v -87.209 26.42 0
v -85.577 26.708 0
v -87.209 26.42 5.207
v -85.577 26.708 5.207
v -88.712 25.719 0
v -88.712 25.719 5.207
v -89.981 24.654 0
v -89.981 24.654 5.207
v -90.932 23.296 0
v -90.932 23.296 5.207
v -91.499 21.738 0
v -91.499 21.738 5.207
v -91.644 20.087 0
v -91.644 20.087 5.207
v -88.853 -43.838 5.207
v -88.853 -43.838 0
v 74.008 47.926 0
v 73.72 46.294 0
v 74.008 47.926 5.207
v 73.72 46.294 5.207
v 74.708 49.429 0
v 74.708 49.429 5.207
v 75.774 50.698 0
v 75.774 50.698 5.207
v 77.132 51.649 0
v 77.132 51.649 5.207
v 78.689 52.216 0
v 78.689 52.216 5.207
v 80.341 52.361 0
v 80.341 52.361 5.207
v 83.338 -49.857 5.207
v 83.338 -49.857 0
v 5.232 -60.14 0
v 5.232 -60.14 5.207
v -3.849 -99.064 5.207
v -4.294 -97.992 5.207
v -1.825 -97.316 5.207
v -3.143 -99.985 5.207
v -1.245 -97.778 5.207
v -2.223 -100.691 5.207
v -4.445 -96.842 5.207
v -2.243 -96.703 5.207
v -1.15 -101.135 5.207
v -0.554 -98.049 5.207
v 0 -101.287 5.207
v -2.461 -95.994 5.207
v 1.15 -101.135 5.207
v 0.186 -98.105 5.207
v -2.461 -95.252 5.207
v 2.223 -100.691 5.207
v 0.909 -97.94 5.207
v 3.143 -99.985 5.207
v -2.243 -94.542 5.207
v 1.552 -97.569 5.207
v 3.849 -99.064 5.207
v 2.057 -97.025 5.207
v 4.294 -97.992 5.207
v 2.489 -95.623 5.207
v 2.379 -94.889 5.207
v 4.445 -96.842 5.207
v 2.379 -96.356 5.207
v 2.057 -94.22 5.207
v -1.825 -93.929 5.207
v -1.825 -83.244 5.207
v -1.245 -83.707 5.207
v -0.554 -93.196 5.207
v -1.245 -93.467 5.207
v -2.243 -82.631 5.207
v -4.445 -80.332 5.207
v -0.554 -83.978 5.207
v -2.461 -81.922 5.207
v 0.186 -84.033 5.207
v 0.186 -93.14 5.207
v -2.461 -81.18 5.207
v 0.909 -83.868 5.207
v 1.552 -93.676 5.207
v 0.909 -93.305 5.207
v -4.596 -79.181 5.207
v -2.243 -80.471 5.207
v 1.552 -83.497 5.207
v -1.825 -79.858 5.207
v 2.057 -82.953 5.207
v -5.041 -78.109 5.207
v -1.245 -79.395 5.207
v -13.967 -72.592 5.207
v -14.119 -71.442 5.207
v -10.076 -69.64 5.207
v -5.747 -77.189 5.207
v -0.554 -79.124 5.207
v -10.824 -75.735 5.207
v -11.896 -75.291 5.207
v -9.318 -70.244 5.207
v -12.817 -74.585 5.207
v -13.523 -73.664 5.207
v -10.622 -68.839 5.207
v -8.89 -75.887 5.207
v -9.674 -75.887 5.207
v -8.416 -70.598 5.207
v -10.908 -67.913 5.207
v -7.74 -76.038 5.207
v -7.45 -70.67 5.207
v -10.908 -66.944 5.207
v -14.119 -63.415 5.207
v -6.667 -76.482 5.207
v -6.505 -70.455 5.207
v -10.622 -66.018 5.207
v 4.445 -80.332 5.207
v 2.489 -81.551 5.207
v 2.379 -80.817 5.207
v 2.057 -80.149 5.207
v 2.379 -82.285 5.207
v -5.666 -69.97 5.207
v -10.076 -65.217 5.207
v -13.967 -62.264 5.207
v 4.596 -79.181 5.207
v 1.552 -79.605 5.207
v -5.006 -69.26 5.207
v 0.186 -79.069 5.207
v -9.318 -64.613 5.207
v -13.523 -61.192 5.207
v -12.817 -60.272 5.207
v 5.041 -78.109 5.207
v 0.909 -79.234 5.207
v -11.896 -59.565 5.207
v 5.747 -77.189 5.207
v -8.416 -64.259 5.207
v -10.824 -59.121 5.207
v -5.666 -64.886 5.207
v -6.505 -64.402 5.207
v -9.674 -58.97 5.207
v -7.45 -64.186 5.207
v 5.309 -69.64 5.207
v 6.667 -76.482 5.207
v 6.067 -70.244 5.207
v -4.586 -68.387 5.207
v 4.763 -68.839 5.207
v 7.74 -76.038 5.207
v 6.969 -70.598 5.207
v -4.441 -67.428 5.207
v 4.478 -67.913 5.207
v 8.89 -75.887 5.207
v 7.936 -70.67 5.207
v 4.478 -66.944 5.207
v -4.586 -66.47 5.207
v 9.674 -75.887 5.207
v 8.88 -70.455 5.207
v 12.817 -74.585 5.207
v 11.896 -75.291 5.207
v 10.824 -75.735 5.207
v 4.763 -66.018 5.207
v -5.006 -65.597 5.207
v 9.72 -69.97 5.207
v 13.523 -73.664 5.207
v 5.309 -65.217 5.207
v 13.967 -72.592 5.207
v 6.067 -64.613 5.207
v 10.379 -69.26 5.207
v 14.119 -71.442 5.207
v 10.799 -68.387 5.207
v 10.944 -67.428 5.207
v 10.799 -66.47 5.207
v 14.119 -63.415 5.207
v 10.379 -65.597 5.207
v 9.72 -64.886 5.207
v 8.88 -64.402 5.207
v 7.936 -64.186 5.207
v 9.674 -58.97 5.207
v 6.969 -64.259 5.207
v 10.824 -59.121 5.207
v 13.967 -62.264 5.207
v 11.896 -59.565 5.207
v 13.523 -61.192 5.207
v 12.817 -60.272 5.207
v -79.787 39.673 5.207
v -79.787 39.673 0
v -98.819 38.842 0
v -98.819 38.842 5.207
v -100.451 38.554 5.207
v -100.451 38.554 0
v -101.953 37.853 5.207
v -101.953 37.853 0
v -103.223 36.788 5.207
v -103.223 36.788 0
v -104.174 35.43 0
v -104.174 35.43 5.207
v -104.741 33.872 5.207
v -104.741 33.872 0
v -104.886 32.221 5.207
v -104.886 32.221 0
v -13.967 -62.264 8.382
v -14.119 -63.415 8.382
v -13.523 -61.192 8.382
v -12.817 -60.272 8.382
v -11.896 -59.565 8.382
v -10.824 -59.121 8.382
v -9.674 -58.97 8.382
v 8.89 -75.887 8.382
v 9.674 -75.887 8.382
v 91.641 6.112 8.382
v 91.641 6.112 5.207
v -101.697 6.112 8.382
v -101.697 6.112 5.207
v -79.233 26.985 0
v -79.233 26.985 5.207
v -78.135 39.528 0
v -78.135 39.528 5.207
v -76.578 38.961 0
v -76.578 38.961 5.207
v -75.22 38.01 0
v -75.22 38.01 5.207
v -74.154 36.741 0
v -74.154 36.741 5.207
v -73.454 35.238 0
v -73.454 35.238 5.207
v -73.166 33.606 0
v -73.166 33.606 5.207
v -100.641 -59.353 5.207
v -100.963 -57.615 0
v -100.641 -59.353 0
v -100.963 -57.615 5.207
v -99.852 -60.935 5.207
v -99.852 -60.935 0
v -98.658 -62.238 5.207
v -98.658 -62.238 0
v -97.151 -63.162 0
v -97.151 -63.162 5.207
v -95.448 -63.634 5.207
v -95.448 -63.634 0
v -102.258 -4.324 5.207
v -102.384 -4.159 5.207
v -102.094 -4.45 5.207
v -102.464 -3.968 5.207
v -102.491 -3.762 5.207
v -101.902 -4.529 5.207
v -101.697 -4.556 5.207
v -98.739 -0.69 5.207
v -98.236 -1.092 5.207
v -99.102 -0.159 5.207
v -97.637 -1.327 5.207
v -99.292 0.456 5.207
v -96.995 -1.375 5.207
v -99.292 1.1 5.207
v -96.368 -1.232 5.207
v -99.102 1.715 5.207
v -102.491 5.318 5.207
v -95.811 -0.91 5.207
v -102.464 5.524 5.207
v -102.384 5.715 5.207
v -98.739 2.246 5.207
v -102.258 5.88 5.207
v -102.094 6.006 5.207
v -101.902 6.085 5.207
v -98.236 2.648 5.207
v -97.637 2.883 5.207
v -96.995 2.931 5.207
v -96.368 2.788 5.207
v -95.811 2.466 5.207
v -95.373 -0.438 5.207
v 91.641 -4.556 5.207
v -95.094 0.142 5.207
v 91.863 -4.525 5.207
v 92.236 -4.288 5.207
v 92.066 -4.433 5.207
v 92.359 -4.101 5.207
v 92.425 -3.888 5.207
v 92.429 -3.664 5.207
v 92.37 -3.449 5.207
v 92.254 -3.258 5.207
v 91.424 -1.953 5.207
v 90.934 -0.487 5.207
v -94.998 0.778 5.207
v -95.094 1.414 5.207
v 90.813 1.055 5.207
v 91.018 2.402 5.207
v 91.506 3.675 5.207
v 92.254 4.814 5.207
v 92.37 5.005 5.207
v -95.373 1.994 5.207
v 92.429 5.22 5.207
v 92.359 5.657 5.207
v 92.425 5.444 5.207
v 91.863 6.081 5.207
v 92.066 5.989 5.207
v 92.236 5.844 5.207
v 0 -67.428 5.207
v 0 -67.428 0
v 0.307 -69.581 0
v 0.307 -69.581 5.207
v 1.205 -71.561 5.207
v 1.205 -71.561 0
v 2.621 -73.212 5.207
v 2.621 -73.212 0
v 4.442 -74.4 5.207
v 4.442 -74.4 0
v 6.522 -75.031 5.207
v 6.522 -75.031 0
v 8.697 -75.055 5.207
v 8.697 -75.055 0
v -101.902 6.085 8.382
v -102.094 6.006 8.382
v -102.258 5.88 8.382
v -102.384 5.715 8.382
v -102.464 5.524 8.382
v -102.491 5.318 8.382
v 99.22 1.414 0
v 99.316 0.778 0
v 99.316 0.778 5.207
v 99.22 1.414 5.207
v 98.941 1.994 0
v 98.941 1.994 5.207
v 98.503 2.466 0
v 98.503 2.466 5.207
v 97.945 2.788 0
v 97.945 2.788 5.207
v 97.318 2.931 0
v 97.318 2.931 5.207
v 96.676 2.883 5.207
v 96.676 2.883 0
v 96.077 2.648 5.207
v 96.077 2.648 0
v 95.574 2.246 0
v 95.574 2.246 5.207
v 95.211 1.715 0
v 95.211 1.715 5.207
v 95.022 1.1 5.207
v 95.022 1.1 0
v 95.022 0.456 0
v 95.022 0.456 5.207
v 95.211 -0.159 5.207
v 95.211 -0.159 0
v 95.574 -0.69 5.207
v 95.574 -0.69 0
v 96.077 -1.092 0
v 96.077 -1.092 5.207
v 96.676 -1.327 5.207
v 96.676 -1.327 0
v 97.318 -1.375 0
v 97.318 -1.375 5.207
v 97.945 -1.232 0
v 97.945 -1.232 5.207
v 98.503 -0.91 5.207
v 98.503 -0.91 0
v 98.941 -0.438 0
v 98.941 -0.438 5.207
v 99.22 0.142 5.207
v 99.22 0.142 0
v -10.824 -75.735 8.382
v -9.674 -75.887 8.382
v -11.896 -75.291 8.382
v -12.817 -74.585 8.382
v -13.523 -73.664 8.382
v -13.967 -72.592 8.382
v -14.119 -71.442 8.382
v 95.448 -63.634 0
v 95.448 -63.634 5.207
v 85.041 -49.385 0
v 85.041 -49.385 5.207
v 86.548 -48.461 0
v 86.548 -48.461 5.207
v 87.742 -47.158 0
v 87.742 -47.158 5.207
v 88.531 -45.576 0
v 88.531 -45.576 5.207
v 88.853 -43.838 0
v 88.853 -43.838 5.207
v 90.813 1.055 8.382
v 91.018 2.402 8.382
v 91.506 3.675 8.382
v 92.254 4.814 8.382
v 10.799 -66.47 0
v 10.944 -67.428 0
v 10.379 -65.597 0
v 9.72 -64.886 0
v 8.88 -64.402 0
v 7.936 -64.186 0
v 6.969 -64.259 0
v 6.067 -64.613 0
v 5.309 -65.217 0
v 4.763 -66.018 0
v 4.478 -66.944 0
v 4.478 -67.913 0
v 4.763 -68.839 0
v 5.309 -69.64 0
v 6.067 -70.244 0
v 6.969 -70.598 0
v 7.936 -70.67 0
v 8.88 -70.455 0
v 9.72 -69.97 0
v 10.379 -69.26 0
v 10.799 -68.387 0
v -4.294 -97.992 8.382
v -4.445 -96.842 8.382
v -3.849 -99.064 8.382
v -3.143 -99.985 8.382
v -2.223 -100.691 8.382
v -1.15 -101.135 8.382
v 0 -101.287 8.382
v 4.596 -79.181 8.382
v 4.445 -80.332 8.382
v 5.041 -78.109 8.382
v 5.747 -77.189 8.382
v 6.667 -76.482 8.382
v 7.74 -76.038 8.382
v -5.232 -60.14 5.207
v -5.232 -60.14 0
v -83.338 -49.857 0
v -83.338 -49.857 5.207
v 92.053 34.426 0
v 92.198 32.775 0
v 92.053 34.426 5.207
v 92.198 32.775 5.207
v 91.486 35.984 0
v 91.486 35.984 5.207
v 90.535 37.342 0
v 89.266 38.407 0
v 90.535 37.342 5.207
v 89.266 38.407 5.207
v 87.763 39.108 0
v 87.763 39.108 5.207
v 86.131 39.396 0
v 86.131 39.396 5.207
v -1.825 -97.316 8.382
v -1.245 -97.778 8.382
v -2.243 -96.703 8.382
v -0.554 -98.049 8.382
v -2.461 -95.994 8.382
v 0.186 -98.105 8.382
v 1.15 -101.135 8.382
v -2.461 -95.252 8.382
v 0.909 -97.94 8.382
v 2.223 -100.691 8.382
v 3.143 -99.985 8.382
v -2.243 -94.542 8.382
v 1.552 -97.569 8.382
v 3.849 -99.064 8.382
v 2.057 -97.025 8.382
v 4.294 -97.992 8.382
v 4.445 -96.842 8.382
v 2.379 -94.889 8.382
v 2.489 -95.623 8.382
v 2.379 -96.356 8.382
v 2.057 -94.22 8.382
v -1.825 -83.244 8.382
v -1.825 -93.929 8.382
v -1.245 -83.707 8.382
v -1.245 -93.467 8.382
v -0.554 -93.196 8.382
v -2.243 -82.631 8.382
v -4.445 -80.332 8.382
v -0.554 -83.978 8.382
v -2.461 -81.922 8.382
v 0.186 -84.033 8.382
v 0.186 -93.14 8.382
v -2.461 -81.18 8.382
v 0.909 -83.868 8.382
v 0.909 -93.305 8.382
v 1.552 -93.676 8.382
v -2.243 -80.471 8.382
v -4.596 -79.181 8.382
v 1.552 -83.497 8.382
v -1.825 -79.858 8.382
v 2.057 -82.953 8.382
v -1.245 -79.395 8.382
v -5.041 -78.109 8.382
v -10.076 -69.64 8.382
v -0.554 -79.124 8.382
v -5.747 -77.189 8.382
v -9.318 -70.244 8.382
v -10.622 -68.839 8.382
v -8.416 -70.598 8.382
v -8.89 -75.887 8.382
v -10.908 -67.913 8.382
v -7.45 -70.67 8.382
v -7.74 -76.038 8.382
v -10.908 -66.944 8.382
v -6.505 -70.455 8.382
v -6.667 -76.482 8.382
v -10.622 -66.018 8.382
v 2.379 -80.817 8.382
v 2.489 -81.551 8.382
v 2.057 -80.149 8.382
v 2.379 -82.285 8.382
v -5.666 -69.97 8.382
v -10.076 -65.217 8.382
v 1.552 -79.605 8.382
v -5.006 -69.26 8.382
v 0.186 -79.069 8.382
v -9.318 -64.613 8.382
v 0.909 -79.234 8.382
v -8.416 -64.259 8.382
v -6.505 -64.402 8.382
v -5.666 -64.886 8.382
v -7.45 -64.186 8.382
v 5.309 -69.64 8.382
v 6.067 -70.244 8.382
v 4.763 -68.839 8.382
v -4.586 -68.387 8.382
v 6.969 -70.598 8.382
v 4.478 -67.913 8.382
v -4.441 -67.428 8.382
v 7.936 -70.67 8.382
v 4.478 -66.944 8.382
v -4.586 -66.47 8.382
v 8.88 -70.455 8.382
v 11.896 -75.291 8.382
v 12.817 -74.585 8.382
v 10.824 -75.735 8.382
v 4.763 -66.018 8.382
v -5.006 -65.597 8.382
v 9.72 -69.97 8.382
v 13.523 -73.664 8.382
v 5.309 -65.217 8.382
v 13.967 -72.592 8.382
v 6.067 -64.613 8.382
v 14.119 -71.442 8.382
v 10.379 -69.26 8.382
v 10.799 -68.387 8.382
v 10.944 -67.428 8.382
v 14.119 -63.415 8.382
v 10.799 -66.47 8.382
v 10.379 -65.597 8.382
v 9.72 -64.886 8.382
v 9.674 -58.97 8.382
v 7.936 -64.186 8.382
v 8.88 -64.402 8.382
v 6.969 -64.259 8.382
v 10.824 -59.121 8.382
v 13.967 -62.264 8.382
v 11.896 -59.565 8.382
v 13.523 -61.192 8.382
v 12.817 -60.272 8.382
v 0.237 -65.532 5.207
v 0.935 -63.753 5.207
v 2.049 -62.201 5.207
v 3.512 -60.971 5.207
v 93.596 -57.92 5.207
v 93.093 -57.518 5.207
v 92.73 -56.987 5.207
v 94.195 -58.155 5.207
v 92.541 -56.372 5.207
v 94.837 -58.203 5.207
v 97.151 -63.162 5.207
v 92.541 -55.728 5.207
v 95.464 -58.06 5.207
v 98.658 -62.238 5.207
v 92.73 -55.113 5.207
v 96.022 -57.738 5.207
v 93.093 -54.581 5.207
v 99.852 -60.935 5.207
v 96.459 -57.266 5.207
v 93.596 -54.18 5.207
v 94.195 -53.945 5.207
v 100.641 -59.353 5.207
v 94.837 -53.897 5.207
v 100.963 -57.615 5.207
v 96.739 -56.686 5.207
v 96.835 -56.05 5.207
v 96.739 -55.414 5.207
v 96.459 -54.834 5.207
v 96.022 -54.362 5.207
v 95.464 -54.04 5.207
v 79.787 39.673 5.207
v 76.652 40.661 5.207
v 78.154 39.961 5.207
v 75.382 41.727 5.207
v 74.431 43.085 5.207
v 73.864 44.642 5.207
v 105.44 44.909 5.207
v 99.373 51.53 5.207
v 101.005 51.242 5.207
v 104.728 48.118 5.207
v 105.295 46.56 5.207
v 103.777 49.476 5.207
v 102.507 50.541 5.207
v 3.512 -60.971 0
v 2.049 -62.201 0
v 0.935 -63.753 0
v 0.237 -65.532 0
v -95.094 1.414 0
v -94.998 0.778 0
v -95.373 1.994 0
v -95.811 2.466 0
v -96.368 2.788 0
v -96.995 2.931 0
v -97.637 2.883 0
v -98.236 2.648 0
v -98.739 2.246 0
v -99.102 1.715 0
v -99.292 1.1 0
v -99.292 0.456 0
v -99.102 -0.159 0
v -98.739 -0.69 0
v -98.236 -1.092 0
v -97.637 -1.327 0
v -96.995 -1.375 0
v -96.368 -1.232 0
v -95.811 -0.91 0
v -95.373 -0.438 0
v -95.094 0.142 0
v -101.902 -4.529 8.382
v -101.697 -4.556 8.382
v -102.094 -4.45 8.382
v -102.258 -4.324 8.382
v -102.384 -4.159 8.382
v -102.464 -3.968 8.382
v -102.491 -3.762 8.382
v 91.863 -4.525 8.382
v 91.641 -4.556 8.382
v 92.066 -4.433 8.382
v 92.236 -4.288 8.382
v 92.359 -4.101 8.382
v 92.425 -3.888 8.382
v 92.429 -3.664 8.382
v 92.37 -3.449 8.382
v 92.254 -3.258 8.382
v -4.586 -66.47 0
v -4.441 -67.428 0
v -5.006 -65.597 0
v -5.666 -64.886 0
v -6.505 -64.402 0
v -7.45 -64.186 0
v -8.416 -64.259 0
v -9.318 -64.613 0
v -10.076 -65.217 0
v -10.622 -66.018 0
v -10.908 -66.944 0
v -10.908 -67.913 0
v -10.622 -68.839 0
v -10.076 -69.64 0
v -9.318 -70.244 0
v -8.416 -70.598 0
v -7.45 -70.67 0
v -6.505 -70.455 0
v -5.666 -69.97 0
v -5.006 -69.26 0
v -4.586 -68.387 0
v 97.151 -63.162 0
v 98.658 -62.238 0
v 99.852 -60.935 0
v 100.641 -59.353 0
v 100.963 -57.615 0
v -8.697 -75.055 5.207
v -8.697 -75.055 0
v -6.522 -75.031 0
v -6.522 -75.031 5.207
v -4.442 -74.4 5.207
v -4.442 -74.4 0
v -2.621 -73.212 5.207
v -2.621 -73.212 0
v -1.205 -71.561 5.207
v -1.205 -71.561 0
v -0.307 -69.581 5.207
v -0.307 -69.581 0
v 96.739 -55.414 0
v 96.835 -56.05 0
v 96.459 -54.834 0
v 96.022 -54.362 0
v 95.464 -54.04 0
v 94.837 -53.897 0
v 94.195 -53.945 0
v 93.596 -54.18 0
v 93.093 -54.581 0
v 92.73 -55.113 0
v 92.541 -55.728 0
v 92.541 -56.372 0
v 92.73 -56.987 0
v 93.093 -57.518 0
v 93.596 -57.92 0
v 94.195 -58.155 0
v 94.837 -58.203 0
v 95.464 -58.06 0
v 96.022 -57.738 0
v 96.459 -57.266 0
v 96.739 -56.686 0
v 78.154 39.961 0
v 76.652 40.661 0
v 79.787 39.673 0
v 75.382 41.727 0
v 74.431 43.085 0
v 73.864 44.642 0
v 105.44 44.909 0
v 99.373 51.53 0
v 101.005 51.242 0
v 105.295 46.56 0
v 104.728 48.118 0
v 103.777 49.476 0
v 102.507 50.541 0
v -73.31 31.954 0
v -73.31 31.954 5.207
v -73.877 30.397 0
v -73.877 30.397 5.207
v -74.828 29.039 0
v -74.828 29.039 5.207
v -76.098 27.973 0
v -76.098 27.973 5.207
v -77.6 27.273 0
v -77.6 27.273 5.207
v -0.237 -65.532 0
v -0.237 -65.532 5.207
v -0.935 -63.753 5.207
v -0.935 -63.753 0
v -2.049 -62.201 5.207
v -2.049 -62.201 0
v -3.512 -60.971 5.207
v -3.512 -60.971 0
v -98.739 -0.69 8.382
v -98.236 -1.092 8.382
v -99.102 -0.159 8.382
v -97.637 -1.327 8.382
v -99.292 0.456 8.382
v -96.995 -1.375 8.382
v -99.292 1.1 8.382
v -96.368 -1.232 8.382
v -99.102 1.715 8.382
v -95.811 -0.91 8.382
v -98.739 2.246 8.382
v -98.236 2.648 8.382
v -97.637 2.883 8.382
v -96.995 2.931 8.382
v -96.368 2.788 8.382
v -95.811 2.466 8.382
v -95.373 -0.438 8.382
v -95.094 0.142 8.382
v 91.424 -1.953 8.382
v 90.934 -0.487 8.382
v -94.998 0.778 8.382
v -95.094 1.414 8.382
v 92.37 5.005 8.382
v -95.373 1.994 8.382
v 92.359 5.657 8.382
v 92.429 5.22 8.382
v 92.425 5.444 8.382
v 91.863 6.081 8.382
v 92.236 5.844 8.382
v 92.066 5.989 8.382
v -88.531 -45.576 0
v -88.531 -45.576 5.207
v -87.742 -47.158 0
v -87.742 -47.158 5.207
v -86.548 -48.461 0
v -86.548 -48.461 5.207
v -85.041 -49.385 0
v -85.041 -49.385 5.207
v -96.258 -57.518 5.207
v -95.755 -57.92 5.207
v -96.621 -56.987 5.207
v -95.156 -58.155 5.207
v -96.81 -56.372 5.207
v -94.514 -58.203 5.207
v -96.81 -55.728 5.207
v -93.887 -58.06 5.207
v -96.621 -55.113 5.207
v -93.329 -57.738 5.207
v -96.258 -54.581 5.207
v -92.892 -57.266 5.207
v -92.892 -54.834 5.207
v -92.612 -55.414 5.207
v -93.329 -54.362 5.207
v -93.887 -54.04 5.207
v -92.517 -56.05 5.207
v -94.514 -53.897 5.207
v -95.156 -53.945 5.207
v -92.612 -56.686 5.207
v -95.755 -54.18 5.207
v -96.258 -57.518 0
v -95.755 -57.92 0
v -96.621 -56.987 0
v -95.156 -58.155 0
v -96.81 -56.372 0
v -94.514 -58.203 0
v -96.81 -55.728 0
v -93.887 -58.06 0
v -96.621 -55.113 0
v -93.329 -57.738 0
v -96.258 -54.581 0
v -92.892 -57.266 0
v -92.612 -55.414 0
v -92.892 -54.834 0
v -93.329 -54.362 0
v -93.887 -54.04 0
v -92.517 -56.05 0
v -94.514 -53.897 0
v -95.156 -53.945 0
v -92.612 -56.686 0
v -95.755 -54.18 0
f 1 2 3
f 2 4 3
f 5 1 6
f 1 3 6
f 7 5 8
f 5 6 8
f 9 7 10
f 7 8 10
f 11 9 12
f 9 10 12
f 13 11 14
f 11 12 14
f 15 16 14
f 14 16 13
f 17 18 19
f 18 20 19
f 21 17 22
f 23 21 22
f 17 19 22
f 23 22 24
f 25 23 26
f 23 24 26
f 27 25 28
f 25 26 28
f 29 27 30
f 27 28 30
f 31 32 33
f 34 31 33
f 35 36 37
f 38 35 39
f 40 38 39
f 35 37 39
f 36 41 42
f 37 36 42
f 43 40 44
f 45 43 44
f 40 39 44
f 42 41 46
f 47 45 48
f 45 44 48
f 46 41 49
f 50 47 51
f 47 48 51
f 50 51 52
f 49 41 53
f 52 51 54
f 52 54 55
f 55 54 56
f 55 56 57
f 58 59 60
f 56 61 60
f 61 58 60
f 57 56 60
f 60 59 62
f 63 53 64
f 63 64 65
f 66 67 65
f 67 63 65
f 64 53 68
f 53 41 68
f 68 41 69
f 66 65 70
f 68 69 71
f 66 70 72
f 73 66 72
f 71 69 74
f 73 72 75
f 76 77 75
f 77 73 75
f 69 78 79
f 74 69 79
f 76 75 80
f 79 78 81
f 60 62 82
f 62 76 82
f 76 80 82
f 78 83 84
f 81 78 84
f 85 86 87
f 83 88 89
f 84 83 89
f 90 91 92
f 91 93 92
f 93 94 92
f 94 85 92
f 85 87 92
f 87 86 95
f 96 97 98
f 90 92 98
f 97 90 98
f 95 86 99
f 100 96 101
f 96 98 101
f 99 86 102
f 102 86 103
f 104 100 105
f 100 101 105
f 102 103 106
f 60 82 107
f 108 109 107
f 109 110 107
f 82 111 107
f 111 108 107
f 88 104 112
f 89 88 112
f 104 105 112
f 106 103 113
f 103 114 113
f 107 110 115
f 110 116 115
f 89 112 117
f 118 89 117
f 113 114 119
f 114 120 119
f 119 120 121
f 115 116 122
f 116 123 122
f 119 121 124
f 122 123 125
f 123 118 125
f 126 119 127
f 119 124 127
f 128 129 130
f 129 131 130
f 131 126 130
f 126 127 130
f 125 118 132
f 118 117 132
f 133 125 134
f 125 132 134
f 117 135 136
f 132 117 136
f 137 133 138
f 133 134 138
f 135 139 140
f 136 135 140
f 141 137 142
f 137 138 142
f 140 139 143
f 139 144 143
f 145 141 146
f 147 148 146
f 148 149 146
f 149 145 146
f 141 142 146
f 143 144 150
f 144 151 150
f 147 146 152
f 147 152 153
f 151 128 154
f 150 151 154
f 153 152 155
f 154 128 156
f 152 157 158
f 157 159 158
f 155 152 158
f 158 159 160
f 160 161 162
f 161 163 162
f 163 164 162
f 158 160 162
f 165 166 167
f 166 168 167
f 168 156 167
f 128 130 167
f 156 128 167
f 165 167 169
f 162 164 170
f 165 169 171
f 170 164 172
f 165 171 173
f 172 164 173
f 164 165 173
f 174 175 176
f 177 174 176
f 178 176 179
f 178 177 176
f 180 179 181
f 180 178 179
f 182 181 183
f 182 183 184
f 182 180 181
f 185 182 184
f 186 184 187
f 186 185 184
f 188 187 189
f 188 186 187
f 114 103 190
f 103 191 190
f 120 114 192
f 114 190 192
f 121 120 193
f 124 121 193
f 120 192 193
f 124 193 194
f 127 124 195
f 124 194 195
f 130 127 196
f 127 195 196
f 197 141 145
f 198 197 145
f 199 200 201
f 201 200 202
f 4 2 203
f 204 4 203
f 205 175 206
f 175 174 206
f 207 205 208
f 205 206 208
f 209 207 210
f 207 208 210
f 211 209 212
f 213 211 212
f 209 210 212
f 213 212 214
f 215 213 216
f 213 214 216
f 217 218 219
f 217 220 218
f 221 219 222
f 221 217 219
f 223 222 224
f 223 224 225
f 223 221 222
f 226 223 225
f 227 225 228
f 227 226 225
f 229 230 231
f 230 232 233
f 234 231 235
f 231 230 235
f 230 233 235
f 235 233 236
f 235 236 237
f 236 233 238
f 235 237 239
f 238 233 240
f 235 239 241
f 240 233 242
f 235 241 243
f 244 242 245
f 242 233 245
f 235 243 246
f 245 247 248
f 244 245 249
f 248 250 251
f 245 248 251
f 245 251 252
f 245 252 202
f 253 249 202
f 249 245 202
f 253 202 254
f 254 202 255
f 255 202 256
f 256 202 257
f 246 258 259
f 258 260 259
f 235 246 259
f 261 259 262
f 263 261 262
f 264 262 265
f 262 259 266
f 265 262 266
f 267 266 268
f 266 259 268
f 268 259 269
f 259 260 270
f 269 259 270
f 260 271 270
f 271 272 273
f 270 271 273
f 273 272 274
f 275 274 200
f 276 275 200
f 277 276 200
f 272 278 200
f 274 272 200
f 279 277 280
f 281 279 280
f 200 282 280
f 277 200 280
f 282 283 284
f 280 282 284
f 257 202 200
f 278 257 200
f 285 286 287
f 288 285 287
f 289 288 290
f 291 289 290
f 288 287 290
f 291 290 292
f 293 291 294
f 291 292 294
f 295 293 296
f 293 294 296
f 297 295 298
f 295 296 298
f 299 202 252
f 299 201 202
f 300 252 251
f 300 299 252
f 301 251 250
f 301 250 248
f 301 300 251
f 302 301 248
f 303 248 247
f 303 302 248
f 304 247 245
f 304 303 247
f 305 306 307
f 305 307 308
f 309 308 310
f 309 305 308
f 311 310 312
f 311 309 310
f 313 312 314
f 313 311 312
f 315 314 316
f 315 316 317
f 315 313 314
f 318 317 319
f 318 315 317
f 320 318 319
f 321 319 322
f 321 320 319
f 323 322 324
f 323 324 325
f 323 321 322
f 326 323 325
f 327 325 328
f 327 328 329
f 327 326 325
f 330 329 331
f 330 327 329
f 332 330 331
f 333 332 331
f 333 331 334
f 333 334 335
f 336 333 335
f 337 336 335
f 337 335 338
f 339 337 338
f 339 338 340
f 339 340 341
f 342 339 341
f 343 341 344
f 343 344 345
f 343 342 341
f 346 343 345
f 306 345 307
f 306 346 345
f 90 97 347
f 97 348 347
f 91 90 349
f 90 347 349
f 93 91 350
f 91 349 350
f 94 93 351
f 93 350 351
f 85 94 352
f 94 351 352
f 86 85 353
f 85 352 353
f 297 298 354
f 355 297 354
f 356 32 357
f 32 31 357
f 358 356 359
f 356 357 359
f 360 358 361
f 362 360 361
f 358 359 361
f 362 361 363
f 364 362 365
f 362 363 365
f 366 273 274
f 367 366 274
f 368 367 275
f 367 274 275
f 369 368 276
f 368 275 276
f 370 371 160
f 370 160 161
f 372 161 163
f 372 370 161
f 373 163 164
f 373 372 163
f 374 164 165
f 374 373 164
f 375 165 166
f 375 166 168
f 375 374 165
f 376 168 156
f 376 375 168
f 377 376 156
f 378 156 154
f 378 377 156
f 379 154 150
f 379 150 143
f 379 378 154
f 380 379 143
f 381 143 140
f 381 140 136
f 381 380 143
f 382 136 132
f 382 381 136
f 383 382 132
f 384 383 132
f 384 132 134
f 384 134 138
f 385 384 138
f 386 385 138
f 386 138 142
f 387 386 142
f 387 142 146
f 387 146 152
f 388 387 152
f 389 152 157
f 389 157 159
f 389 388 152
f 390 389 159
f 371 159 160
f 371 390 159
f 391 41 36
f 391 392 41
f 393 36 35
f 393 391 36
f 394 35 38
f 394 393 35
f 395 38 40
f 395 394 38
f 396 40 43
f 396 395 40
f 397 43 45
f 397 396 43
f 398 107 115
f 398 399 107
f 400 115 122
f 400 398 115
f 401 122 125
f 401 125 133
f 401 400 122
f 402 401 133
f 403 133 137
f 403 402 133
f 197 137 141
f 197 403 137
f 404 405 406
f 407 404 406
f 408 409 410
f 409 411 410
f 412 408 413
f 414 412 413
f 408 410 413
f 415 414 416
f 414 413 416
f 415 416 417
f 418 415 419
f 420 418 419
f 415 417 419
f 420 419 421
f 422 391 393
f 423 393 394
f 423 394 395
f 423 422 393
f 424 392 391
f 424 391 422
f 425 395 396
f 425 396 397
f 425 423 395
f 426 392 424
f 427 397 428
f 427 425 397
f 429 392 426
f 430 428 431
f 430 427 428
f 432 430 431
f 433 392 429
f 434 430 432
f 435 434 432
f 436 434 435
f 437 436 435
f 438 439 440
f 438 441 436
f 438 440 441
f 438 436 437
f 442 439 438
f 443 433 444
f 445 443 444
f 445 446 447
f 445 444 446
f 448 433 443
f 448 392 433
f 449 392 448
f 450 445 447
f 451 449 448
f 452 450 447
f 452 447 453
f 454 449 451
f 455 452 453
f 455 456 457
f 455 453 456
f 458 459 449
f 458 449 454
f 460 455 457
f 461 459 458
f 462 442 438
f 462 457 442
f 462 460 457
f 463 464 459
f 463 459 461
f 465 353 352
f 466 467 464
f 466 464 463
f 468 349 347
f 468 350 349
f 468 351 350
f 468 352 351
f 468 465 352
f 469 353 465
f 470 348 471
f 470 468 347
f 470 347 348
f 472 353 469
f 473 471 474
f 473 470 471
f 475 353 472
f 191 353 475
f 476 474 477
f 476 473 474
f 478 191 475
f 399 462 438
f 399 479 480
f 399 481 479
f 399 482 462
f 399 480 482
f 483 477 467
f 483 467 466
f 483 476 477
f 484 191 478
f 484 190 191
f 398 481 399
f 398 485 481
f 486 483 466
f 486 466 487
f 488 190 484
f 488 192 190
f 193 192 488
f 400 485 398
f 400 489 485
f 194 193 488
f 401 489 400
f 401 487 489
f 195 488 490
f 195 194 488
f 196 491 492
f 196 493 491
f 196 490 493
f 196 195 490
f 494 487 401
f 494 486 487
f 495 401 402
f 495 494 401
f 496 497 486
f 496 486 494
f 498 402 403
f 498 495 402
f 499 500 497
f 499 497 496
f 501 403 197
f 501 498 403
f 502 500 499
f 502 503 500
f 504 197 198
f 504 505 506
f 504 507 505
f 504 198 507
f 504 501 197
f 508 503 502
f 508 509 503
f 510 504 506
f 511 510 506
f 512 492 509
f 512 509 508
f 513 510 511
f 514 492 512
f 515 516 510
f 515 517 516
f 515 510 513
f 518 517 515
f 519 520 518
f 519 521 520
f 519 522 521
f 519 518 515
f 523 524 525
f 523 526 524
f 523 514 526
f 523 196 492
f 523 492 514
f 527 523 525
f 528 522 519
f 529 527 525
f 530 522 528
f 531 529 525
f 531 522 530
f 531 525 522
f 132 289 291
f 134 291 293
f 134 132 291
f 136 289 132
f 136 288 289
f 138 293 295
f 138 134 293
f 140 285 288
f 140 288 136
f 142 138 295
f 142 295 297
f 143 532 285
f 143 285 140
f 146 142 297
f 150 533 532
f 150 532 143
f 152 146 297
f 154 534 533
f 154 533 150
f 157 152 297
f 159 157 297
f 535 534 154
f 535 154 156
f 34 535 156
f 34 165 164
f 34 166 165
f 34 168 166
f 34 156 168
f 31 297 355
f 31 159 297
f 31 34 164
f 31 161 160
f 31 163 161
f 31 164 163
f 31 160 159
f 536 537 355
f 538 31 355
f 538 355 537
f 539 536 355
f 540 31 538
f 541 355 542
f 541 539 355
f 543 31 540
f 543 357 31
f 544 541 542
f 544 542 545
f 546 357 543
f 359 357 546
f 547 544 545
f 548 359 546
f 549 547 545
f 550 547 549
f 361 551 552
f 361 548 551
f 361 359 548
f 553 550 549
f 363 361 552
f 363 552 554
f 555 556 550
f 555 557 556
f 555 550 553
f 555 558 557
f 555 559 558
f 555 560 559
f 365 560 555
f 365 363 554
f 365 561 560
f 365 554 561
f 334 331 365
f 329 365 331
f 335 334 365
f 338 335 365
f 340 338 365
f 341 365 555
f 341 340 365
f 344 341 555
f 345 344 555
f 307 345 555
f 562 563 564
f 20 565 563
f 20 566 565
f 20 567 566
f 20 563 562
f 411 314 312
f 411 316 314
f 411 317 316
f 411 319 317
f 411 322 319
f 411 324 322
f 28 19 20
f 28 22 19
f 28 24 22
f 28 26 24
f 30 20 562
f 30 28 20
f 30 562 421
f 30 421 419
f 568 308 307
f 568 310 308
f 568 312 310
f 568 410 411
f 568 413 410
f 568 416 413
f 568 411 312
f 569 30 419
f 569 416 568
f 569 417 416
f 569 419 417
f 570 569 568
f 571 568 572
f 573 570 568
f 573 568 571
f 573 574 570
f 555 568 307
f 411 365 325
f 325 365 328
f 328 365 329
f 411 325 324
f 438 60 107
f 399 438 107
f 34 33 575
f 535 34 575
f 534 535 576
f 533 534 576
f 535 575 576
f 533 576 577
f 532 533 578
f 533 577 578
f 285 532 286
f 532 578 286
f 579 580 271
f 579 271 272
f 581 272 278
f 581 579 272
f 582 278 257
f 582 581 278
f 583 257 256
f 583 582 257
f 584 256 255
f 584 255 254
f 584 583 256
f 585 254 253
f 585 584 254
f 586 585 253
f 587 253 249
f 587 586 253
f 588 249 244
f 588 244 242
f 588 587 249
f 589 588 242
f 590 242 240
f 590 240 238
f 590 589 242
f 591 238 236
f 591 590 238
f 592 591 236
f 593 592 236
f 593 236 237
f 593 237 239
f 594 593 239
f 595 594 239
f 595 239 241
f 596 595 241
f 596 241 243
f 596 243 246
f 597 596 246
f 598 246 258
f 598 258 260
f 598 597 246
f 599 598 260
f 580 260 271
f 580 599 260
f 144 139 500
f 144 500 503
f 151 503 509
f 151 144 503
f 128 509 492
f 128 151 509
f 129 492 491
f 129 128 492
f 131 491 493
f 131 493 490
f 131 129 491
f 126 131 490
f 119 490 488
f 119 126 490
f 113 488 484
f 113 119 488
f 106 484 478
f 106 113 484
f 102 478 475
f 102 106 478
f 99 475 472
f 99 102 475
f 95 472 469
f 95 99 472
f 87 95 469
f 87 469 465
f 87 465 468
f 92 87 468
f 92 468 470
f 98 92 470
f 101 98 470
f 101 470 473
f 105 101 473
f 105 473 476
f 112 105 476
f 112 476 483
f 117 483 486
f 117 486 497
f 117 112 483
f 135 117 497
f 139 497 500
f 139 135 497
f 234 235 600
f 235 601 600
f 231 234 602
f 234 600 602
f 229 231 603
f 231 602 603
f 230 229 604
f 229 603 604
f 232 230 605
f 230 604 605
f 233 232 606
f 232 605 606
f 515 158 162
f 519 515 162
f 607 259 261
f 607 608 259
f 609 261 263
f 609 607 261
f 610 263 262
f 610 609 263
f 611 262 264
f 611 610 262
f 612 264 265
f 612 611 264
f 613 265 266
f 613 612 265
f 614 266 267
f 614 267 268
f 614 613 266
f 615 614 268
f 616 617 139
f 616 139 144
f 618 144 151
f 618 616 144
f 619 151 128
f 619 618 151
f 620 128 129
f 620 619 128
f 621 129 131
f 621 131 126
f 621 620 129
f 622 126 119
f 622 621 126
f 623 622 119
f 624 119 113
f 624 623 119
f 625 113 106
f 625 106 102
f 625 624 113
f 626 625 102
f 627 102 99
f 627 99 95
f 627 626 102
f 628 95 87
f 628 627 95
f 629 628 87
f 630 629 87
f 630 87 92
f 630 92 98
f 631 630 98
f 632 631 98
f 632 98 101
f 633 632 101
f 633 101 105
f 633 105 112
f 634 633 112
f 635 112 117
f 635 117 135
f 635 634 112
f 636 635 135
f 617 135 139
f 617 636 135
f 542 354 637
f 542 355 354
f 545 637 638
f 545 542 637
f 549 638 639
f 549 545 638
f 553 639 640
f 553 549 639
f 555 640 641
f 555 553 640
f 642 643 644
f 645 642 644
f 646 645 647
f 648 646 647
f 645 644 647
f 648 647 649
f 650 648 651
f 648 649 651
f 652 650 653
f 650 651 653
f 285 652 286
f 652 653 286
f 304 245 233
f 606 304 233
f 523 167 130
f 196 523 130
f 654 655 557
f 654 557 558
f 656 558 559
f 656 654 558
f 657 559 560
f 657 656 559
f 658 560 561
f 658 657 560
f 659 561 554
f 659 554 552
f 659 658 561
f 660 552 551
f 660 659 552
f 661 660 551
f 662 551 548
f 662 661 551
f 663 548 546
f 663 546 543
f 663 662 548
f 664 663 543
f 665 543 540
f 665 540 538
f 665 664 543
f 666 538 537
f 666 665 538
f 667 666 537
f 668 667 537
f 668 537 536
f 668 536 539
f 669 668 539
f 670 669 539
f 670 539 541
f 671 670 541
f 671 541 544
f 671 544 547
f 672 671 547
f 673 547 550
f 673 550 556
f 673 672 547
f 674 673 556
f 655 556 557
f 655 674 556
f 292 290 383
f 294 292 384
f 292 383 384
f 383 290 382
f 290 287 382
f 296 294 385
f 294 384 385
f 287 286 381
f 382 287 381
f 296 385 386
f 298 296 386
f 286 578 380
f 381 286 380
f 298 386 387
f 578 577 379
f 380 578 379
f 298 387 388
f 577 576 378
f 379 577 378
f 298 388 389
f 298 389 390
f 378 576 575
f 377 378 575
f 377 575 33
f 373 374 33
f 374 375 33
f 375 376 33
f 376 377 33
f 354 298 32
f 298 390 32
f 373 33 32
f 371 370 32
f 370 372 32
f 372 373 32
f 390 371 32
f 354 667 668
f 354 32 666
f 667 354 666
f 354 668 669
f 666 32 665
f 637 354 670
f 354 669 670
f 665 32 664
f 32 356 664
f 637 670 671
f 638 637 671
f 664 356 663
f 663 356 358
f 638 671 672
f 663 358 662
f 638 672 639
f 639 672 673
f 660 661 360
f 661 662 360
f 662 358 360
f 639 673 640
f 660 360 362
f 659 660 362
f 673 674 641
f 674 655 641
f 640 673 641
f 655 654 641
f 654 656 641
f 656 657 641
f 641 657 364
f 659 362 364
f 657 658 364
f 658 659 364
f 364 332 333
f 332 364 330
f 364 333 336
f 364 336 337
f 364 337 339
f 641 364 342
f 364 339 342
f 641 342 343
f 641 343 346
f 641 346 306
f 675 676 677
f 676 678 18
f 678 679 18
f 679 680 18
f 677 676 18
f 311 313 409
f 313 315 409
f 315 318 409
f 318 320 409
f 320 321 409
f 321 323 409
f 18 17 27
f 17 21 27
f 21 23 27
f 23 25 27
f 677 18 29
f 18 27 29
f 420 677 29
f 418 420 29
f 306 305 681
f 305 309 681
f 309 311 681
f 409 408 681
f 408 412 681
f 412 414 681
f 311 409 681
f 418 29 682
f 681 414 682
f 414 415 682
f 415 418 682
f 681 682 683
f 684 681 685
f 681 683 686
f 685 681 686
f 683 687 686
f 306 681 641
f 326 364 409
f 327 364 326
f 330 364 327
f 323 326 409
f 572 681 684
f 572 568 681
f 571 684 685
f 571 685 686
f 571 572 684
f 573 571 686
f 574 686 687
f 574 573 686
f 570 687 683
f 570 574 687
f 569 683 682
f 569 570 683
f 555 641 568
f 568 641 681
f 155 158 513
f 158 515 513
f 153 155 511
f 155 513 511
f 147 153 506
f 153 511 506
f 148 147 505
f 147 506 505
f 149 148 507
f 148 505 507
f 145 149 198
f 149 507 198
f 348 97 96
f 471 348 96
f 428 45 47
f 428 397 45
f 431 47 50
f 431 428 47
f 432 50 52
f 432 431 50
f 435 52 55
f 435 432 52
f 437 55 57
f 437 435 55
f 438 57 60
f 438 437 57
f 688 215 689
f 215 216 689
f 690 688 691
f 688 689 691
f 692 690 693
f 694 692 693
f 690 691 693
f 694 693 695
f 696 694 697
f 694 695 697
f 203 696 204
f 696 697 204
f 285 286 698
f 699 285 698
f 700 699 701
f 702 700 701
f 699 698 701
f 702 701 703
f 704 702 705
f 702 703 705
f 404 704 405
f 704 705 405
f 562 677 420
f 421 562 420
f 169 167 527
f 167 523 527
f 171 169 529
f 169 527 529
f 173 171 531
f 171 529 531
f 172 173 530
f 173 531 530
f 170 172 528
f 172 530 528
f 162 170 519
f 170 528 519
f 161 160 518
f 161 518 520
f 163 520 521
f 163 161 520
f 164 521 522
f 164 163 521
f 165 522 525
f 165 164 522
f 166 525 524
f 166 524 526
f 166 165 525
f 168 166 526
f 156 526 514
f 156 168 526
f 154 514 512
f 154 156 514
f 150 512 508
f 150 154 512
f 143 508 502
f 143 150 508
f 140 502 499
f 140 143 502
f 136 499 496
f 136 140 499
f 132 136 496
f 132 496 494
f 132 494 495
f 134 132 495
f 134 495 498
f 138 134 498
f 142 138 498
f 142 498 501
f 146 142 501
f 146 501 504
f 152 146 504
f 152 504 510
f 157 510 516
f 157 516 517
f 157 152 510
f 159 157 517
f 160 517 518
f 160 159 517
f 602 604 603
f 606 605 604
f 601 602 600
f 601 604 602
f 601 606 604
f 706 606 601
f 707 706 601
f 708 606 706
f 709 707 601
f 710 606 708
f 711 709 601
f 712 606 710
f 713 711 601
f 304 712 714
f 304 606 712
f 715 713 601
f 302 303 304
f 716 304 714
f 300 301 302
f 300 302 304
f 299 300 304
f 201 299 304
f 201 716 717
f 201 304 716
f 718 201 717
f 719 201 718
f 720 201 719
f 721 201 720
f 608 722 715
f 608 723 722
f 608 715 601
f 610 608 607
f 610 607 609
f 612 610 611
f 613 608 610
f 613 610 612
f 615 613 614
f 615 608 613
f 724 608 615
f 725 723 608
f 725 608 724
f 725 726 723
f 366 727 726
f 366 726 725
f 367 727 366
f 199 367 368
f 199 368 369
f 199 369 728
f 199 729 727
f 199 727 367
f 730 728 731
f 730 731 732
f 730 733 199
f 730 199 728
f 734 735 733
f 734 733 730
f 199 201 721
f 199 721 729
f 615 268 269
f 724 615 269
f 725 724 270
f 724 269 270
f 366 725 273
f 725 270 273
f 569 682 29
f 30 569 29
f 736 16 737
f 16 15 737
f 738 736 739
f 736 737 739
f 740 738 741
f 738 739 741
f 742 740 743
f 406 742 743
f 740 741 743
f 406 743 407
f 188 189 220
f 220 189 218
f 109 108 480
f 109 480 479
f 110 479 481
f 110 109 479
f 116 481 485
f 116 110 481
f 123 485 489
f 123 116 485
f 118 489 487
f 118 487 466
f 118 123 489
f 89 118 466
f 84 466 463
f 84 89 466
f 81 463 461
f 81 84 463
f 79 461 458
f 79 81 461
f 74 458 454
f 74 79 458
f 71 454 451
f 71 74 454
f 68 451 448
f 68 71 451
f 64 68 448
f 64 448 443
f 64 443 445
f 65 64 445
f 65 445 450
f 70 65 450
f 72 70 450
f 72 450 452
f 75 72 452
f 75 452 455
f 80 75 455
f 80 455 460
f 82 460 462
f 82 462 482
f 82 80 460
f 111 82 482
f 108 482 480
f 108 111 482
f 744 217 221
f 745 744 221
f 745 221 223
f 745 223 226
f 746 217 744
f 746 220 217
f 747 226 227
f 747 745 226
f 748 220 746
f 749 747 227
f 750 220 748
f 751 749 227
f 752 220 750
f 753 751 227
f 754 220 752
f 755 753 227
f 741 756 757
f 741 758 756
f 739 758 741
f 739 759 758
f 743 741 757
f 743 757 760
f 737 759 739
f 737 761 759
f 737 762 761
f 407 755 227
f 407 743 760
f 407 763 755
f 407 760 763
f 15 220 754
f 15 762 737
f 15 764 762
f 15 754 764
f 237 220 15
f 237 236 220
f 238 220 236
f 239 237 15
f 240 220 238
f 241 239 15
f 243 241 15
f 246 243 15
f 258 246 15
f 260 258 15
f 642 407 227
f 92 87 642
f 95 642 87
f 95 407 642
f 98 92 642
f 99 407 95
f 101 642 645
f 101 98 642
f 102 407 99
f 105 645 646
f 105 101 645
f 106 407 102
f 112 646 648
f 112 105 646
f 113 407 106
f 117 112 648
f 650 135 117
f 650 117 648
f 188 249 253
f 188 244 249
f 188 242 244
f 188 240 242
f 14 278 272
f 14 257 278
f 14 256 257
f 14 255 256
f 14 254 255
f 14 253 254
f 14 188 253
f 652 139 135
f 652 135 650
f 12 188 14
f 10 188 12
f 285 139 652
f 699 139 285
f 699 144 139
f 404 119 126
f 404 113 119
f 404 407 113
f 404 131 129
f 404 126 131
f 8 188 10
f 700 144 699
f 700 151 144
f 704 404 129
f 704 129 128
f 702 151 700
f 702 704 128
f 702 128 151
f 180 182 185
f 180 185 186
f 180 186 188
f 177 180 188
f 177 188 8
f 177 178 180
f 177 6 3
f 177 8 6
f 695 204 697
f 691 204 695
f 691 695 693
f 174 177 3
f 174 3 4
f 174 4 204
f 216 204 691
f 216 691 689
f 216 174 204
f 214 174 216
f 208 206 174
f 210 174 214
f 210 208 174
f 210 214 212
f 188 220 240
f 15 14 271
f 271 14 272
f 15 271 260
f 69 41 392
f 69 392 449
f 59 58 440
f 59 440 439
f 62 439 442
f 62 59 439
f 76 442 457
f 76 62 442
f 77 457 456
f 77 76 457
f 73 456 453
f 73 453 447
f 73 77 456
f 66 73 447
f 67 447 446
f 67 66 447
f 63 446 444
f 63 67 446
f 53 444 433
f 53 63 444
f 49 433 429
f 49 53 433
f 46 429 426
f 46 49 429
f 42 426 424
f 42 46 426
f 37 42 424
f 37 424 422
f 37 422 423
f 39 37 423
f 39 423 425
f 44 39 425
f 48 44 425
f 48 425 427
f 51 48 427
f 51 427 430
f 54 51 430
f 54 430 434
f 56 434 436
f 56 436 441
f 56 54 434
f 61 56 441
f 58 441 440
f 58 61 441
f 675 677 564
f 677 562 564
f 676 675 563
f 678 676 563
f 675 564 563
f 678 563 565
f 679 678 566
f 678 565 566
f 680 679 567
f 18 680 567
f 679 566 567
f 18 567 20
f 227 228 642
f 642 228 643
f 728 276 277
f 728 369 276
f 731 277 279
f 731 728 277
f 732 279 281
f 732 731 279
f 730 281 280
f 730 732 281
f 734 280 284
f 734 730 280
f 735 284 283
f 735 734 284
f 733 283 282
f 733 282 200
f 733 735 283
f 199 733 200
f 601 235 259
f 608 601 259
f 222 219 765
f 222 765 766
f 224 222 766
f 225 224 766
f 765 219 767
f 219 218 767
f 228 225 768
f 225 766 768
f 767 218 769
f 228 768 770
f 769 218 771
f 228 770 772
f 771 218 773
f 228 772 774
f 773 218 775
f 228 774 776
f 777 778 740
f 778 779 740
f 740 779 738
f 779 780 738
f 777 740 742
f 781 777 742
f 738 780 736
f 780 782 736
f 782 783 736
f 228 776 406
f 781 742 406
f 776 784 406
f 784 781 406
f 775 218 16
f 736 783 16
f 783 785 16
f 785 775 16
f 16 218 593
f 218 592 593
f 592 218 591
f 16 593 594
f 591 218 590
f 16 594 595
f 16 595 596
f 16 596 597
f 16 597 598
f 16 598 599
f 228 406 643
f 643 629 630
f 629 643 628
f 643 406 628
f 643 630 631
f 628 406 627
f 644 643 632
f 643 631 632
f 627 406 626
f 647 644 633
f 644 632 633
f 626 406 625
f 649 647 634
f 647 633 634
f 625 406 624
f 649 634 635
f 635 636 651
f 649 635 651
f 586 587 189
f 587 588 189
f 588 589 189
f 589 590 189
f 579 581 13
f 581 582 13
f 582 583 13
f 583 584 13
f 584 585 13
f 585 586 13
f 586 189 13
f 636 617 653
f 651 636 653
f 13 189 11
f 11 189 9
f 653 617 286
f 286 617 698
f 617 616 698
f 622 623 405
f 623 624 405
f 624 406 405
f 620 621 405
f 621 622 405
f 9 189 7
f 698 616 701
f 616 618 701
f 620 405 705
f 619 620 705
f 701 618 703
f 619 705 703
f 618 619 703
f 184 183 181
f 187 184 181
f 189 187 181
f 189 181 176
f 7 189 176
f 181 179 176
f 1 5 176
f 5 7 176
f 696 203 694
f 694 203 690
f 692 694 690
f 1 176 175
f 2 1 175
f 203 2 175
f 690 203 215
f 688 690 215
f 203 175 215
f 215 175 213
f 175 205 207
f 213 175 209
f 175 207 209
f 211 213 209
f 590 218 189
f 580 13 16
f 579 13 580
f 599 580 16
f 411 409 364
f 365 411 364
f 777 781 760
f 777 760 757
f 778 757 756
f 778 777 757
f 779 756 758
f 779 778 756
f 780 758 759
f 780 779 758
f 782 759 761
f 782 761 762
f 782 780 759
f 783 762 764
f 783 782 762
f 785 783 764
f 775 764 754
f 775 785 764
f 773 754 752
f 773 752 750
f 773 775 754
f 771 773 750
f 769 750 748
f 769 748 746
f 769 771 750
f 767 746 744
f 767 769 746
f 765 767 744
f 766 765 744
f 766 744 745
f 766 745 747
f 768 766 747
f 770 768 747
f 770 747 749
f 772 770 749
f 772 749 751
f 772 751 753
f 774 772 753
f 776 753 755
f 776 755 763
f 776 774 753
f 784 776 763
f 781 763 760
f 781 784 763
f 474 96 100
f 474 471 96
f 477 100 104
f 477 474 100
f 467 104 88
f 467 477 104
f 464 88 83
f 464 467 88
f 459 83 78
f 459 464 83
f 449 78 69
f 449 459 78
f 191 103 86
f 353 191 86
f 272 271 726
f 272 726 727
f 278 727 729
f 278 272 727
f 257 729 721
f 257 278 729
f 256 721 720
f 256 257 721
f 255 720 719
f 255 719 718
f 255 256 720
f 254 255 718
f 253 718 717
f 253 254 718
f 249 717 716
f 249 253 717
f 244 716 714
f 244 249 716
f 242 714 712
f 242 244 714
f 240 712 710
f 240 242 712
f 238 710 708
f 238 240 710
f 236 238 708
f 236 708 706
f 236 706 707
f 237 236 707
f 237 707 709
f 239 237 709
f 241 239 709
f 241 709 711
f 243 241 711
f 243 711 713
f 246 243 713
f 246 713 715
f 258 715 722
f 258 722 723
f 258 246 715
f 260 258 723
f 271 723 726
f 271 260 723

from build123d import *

# Parameters (mm, degrees)
F0_R     = 3.2512
F0_R_2   = 2.159
F1_DEPTH = 5.207
F2_R     = 3.2512
F2_W     = 8.89
F2_H     = 25.4
F2_R_2   = 2.4892
F3_DEPTH = 3.175
F4_R     = 4.44499
F5_R     = 2.159
F6_DEPTH = 3.175
F7_R     = 0.79375
F8_R     = 6.34999
F8_2_R   = 6.34999


# Not quite as in the source:
# - a fillet or chamfer is up to 0.001 mm smaller than in the source, because OpenCascade refuses the exact size


with BuildPart() as f1:
    # F0 (on Top) → F1 (new body)
    with BuildSketch(Plane.XY):
        with BuildLine():
            ThreePointArc((5.2321866987, -60.139664194), (1.4434761951, -62.9421602277), (0, -67.4282150393))
            ThreePointArc((0, -67.4282150393), (2.6205330591, -73.2118547441), (8.6967411267, -75.0550523098))
            Line((8.6967411267, -75.0550523098), (100.7307979156, -62.9385388704))
            Line((100.7307979156, -62.9385388704), (105.7164938914, 51.2526728564))
            Line((105.7164938914, 51.2526728564), (73.9967128562, 52.6375884052))
            Line((73.9967128562, 52.6375884052), (73.4427466367, 39.9496759911))
            Line((73.4427466367, 39.9496759911), (92.4746152578, 39.1187266618))
            Line((92.4746152578, 39.1187266618), (88.6202207603, -49.1614212409))
            Line((88.6202207603, -49.1614212409), (5.2321866987, -60.139664194))
        make_face()
        with Locations((7.6926489511, -67.4282150369)):
            Circle(F0_R, mode=Mode.SUBTRACT)
        with Locations((94.6755093379, -56.0499800557)):
            Circle(F0_R_2, mode=Mode.SUBTRACT)
        with Locations((97.1566728062, 0.7780063098)):
            Circle(F0_R_2, mode=Mode.SUBTRACT)
    extrude(amount=F1_DEPTH)

    # F8 (radius 6.35 in the source; OpenCascade refuses exactly that, so slightly less here)
    f8_edges = [f1.edges().sort_by_distance(p)[0] for p in [
        (92.474615, 39.118727, 2.6035),
        (73.442747, 39.949676, 2.6035),
        (73.996713, 52.637588, 2.6035),
        (105.716494, 51.252673, 2.6035),
        (100.730798, -62.938539, 2.6035),
        (88.620221, -49.161421, 2.6035),
    ]]
    fillet(f8_edges, radius=F8_R)


with BuildPart() as f1b:
    # F0 (on Top) → F1, piece 2 (new body)
    with BuildSketch(Plane.XY):
        with BuildLine():
            Line((-73.4427466367, 39.9496759911), (-105.1625276719, 38.5647604423))
            Line((-105.1625276719, 38.5647604423), (-100.7307979156, -62.9385388704))
            Line((-100.7307979156, -62.9385388704), (-8.6967411267, -75.0550523098))
            ThreePointArc((-8.6967411267, -75.0550523098), (-2.6205330591, -73.2118547441), (0, -67.4282150393))
            ThreePointArc((0, -67.4282150393), (-1.4434761951, -62.9421602277), (-5.2321866987, -60.139664194))
            Line((-5.2321866987, -60.139664194), (-88.6202207603, -49.1614212409))
            Line((-88.6202207603, -49.1614212409), (-91.9206490383, 26.4308142477))
            Line((-91.9206490383, 26.4308142477), (-72.8887804171, 27.261763577))
            Line((-72.8887804171, 27.261763577), (-73.4427466367, 39.9496759911))
        make_face()
        with Locations((-94.6755093379, -56.0499800557)):
            Circle(F0_R_2, mode=Mode.SUBTRACT)
        with Locations((-7.6926489511, -67.4282150369)):
            Circle(F0_R, mode=Mode.SUBTRACT)
        with Locations((-97.1566728062, 0.7780063098)):
            Circle(F0_R_2, mode=Mode.SUBTRACT)
    extrude(amount=F1_DEPTH)

    # F8#2 (radius 6.35 in the source; OpenCascade refuses exactly that, so slightly less here)
    f8_2_edges = [f1b.edges().sort_by_distance(p)[0] for p in [
        (-73.442747, 39.949676, 2.6035),
        (-72.88878, 27.261764, 2.6035),
        (-105.162528, 38.56476, 2.6035),
        (-91.920649, 26.430814, 2.6035),
        (-100.730798, -62.938539, 2.6035),
        (-88.620221, -49.161421, 2.6035),
    ]]
    fillet(f8_2_edges, radius=F8_2_R)


with BuildPart() as f3:
    # F2 (on face) → F3 (new body)
    with BuildSketch(Plane.XY.offset(5.207)):
        with BuildLine():
            Line((-14.1188489511, -75.8867171605), (-4.445, -75.8867171605))
            Line((-4.445, -75.8867171605), (4.445, -75.8867171605))
            Line((4.445, -75.8867171605), (14.1188489511, -75.8867171605))
            Line((14.1188489511, -75.8867171605), (14.1188489511, -58.9697129133))
            Line((14.1188489511, -58.9697129133), (-14.1188489511, -58.9697129133))
            Line((-14.1188489511, -58.9697129133), (-5.2321866987, -60.139664194))
            ThreePointArc((-5.2321866987, -60.139664194), (-0.1994884623, -69.1687304127), (-8.6967411267, -75.0550523098))
            Line((-8.6967411267, -75.0550523098), (-14.1188489511, -74.3412182725))
            Line((-14.1188489511, -74.3412182725), (-14.1188489511, -75.8867171605))
        make_face()
        with Locations((7.6926489511, -67.4282150369)):
            Circle(F2_R, mode=Mode.SUBTRACT)
        with Locations((0, -88.5867171605)):
            Rectangle(F2_W, F2_H)
        with Locations((0, -95.6225171605)):
            Circle(F2_R_2, mode=Mode.SUBTRACT)
        with Locations((0, -81.5509171605)):
            Circle(F2_R_2, mode=Mode.SUBTRACT)
        with BuildLine():
            Line((-14.1188489511, -58.9697129133), (-14.1188489511, -74.3412182725))
            Line((-14.1188489511, -74.3412182725), (-8.6967411267, -75.0550523098))
            ThreePointArc((-8.6967411267, -75.0550523098), (-0.1994884623, -69.1687304127), (-5.2321866987, -60.139664194))
            Line((-5.2321866987, -60.139664194), (-14.1188489511, -58.9697129133))
        make_face()
        with Locations((-7.6926489511, -67.4282150369)):
            Circle(F2_R, mode=Mode.SUBTRACT)
    extrude(amount=F3_DEPTH)

    # F4 (radius 4.445 in the source; OpenCascade refuses exactly that, so slightly less here)
    f4_edges = [f3.edges().sort_by_distance(p)[0] for p in [
        (-4.445, -75.886717, 6.7945),
        (-14.118849, -75.886717, 6.7945),
        (4.445, -75.886717, 6.7945),
        (14.118849, -75.886717, 6.7945),
        (14.118849, -58.969713, 6.7945),
        (-14.118849, -58.969713, 6.7945),
        (-4.445, -101.286717, 6.7945),
        (4.445, -101.286717, 6.7945),
    ]]
    fillet(f4_edges, radius=F4_R)


with BuildPart() as f6:
    # F5 (on face) → F6 (new body)
    with BuildSketch(Plane.XY.offset(5.207)):
        Polygon((90.567735786, -4.5559936902), (90.812716549, 1.0549882694), (91.0335107249, 6.1120063098), (-102.4906728062, 6.1120063098), (-102.4906728062, -4.5559936902), align=None)
        with Locations((-97.1566728062, 0.7780063098)):
            Circle(F5_R, mode=Mode.SUBTRACT)
        with BuildLine():
            ThreePointArc((93.7112491748, -4.5559936902), (91.5149736571, -2.1363942651), (90.812716549, 1.0549882694))
            Line((90.812716549, 1.0549882694), (90.567735786, -4.5559936902))
            Line((90.567735786, -4.5559936902), (93.7112491748, -4.5559936902))
        make_face()
        with BuildLine():
            ThreePointArc((90.812716549, 1.0549882694), (91.6474670997, 3.9357194829), (93.7112491748, 6.1120063098))
            Line((93.7112491748, 6.1120063098), (91.0335107249, 6.1120063098))
            Line((91.0335107249, 6.1120063098), (90.812716549, 1.0549882694))
        make_face()
    extrude(amount=F6_DEPTH)

    # F7
    f7_edges = [f6.edges().sort_by_distance(p)[0] for p in [
        (-102.490673, 6.112006, 6.7945),
        (-102.490673, -4.555994, 6.7945),
        (93.711249, 6.112006, 6.7945),
        (93.711249, -4.555994, 6.7945),
    ]]
    fillet(f7_edges, radius=F7_R)


solid = Compound([f1.part, f1b.part, f3.part, f6.part])
